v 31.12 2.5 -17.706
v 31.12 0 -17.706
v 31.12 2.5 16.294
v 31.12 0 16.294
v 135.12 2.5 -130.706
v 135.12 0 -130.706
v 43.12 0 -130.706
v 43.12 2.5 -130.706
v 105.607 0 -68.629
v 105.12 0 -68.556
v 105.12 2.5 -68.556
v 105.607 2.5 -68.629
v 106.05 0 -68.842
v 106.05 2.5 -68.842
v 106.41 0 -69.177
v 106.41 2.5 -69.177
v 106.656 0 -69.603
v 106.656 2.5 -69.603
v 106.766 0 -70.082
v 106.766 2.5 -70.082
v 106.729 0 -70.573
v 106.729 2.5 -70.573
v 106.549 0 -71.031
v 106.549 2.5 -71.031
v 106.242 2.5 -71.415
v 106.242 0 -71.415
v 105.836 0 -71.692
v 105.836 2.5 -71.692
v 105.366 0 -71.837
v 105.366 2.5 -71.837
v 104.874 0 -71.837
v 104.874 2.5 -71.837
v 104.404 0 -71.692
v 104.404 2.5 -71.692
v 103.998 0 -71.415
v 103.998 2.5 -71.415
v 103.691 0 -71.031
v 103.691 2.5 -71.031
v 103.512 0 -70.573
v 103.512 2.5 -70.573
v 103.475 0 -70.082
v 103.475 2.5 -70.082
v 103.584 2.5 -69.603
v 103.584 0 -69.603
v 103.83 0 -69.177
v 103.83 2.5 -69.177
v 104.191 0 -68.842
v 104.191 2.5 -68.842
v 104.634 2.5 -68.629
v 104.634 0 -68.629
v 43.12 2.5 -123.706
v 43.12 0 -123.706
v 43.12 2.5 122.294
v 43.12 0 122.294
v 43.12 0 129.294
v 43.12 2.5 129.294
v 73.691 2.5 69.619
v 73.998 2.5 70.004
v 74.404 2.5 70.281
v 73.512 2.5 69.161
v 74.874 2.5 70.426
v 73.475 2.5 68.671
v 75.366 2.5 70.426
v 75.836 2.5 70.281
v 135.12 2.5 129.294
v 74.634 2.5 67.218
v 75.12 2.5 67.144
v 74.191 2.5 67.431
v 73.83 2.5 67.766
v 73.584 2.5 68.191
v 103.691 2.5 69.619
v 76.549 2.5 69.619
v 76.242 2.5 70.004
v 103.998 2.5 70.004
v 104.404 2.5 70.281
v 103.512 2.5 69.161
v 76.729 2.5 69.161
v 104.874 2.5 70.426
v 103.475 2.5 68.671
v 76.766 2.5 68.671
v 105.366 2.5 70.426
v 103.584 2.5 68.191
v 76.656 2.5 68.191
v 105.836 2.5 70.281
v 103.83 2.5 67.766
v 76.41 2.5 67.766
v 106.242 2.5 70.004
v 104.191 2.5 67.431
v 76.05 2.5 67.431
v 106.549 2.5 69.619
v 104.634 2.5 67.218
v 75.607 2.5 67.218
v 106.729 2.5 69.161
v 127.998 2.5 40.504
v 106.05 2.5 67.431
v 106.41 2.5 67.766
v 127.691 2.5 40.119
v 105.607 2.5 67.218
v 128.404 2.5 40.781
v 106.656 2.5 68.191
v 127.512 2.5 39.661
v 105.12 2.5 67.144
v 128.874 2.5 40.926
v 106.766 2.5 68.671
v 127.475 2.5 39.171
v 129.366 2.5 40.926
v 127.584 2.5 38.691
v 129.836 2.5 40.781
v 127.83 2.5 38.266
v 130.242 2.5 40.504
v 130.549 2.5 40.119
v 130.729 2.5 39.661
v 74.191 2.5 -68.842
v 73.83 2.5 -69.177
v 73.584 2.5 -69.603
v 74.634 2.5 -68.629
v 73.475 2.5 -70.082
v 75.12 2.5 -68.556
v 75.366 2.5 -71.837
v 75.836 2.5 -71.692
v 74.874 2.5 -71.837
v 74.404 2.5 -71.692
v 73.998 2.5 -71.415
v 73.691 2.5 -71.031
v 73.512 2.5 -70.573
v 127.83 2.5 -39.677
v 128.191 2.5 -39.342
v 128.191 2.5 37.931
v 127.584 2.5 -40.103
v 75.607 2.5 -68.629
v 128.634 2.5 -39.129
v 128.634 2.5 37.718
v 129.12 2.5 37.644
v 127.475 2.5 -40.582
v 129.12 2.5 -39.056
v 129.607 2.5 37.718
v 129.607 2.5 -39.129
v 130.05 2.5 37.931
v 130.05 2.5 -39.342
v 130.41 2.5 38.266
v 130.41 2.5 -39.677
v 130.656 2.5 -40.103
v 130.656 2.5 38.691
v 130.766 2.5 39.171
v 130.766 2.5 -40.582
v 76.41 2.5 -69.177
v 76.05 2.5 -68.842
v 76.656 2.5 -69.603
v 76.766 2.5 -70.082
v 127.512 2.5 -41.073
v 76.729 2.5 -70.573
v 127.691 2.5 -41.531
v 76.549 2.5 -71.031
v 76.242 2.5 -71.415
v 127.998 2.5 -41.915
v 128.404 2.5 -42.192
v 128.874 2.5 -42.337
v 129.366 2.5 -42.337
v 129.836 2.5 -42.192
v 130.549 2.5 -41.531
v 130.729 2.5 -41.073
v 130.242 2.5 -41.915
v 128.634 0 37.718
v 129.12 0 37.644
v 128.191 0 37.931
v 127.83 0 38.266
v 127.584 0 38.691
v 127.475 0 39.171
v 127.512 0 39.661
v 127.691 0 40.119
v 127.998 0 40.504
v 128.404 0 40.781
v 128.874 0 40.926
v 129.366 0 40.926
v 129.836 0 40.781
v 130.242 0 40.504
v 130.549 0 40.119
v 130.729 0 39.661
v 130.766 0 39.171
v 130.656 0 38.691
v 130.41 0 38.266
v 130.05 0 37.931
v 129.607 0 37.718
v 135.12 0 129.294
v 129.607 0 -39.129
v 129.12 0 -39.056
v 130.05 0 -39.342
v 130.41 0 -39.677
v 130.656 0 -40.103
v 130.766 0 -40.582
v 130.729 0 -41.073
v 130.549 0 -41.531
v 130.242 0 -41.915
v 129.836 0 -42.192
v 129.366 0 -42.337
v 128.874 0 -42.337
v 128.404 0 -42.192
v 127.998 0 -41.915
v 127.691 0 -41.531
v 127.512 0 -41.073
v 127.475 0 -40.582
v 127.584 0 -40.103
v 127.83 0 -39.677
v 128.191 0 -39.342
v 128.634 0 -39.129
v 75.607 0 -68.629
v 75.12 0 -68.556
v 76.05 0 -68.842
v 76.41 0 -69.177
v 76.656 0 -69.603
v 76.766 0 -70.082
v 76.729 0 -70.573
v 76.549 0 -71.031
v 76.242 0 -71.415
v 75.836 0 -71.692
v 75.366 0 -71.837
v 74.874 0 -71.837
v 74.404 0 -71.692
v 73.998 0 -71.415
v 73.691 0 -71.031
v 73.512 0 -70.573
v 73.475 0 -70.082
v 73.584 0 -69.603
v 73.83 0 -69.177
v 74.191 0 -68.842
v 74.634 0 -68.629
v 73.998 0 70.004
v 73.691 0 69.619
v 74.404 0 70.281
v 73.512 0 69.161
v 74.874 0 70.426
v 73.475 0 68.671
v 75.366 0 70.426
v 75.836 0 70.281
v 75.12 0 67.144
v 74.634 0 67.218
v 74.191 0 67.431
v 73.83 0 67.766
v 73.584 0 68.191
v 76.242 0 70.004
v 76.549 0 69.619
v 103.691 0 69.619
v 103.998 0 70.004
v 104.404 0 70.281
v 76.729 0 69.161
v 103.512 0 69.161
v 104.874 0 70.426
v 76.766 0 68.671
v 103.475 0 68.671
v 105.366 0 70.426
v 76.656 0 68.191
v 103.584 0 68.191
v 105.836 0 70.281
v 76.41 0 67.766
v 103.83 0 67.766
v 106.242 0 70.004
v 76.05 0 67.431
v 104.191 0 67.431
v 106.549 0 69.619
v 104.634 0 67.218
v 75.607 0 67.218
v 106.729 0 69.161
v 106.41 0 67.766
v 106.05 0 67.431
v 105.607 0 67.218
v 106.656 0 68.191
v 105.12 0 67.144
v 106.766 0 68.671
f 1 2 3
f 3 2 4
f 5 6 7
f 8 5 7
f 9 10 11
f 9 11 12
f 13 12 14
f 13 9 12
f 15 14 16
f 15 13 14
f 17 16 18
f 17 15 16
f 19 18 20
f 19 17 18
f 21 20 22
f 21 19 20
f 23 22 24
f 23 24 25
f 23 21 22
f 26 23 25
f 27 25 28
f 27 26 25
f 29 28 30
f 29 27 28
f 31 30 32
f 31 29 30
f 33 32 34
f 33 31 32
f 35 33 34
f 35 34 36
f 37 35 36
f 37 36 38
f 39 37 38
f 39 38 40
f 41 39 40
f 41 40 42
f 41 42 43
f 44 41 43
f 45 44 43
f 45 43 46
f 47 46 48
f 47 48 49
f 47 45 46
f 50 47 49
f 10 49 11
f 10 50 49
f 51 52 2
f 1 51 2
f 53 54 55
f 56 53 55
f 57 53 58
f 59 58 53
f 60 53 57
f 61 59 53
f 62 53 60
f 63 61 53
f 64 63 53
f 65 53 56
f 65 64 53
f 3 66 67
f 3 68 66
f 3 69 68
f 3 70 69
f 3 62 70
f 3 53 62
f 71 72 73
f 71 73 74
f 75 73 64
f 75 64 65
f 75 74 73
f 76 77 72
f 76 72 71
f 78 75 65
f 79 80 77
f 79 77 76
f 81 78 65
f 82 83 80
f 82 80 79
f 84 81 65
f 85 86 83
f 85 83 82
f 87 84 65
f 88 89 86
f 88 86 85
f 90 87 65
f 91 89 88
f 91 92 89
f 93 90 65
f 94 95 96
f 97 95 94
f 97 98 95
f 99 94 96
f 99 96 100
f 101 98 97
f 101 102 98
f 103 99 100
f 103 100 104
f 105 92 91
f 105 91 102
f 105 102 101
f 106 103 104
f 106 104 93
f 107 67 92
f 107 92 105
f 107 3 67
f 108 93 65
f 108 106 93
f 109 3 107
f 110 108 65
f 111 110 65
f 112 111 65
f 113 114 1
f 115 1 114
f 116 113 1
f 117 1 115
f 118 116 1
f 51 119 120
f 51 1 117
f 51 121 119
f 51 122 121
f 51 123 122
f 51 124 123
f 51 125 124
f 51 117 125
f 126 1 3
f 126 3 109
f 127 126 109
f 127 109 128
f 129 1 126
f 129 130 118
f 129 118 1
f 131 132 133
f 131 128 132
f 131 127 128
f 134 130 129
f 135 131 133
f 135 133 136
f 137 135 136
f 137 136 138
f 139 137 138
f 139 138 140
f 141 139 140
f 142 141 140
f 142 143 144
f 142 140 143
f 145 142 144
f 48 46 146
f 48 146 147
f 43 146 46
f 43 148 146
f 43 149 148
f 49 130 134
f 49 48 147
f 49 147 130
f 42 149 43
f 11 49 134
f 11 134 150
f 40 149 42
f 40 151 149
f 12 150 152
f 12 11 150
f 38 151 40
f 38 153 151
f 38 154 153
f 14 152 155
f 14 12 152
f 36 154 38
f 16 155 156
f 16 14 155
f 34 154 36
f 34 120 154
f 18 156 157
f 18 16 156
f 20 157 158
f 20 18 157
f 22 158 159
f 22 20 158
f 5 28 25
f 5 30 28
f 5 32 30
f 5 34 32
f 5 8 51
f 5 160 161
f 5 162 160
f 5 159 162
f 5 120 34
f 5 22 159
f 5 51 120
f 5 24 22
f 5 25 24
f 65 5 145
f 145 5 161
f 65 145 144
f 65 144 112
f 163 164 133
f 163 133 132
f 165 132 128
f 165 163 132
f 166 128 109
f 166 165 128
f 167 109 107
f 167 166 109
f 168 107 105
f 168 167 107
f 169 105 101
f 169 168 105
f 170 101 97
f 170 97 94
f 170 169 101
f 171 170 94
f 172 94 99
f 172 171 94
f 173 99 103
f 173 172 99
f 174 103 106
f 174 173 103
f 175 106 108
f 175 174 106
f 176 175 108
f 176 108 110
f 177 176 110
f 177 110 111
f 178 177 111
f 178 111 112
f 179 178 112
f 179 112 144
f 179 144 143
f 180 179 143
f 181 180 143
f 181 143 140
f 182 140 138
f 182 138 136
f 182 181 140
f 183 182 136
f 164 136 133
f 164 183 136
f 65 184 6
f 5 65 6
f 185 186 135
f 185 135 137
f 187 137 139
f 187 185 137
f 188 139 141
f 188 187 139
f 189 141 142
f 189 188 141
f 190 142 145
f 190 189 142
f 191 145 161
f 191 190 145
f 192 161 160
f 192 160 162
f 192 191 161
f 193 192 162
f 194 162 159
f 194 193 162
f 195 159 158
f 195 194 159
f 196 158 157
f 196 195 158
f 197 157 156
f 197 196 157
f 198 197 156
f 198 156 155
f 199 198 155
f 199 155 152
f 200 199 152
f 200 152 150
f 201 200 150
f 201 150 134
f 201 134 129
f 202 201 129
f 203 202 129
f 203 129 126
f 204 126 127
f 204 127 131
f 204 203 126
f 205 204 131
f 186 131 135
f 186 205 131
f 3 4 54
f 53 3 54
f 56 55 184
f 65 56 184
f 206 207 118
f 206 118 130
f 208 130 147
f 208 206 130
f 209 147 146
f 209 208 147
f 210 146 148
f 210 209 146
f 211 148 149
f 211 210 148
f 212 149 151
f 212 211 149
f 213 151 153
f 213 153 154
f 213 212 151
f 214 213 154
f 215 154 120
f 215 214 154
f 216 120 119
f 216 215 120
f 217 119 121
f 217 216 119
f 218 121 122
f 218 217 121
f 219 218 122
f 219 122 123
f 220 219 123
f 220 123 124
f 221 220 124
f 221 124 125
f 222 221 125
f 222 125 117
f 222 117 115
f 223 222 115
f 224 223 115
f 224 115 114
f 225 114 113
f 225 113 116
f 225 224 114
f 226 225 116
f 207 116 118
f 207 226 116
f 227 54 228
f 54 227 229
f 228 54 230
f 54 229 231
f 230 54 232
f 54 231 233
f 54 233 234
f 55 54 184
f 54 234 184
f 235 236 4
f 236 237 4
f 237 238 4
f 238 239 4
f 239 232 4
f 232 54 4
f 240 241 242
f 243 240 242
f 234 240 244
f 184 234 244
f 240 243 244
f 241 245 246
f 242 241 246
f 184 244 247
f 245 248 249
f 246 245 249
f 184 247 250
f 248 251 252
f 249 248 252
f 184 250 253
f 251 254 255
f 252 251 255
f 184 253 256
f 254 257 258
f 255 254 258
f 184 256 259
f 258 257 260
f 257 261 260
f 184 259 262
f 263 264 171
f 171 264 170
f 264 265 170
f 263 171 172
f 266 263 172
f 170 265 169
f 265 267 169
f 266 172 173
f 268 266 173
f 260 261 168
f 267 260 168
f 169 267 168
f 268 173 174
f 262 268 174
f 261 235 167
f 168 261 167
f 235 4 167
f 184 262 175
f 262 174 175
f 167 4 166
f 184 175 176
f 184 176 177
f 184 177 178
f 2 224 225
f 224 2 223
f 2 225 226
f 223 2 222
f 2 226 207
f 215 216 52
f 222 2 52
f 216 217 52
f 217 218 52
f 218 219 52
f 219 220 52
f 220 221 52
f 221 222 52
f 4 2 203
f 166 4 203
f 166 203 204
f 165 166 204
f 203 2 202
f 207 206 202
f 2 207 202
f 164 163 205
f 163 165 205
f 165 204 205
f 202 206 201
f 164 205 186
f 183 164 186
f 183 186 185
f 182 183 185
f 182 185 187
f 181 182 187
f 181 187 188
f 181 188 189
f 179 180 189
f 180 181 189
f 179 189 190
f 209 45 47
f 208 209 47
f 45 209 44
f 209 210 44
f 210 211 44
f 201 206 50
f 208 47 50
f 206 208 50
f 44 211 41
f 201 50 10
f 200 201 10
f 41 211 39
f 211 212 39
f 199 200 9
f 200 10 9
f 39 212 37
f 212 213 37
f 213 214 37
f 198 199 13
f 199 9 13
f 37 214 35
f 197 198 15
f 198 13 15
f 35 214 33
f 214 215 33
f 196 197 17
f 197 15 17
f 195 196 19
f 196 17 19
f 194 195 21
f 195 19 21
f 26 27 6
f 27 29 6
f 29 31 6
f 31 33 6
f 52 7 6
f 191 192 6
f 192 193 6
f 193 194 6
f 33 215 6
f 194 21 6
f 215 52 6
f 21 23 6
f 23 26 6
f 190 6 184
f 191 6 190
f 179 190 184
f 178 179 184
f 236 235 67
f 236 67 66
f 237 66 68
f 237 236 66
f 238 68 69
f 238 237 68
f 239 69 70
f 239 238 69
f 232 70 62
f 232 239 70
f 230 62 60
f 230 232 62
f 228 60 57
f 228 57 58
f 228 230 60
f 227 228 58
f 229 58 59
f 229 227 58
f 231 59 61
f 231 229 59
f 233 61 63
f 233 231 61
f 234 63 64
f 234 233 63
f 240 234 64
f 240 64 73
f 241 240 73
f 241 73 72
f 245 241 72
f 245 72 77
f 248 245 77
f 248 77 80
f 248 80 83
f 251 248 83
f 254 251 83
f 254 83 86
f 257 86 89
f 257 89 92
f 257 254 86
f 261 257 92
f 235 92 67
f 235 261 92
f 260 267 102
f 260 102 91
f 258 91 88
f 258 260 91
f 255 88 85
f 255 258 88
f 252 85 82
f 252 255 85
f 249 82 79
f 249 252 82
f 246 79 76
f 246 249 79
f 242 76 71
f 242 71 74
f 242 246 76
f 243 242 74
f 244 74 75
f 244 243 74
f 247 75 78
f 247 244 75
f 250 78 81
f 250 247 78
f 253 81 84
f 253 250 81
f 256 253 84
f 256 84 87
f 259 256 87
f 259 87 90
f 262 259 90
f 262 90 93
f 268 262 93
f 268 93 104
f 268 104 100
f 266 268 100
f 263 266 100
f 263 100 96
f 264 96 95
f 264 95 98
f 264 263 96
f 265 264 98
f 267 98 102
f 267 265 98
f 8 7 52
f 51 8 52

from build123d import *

# Parameters (mm, degrees)
SKETCH_1_R      = 1.65
EXTRUDE_1_DEPTH = 2.5


with BuildPart() as part:
    # 草图1 → 凸台-拉伸1 (new body)
    with BuildSketch(Plane(origin=(0, 0, 0), x_dir=(1, 0, 0), z_dir=(0, 1, 0))):
        Polygon((85.273637, -129.294264731), (135.120165849, -129.294264731), (135.120165849, 130.705735269), (85.273637, 130.705735269), (43.120165849, 130.705735269), (43.120165849, 123.705735269), (31.120165849, 17.705735269), (31.120165849, -16.294264731), (43.120165849, -122.294264731), (43.120165849, -129.294264731), align=None)
        with Locations(Location((105.120165849, 70.205735269, 0), (0, 0, 270))):
            Circle(SKETCH_1_R, mode=Mode.SUBTRACT)
        with Locations(Location((75.120165849, 70.205735269, 0), (0, 0, 270))):
            Circle(SKETCH_1_R, mode=Mode.SUBTRACT)
        with Locations(Location((75.120165849, -68.794264731, 0), (0, 0, 90))):
            Circle(SKETCH_1_R, mode=Mode.SUBTRACT)
        with Locations(Location((105.120165849, -68.794264731, 0), (0, 0, 90))):
            Circle(SKETCH_1_R, mode=Mode.SUBTRACT)
        with Locations(Location((129.120165849, 40.705735269, 0), (0, 0, 270))):
            Circle(SKETCH_1_R, mode=Mode.SUBTRACT)
        with Locations(Location((129.120165849, -39.294264731, 0), (0, 0, 90))):
            Circle(SKETCH_1_R, mode=Mode.SUBTRACT)
    extrude(amount=EXTRUDE_1_DEPTH)


solid = part.part
